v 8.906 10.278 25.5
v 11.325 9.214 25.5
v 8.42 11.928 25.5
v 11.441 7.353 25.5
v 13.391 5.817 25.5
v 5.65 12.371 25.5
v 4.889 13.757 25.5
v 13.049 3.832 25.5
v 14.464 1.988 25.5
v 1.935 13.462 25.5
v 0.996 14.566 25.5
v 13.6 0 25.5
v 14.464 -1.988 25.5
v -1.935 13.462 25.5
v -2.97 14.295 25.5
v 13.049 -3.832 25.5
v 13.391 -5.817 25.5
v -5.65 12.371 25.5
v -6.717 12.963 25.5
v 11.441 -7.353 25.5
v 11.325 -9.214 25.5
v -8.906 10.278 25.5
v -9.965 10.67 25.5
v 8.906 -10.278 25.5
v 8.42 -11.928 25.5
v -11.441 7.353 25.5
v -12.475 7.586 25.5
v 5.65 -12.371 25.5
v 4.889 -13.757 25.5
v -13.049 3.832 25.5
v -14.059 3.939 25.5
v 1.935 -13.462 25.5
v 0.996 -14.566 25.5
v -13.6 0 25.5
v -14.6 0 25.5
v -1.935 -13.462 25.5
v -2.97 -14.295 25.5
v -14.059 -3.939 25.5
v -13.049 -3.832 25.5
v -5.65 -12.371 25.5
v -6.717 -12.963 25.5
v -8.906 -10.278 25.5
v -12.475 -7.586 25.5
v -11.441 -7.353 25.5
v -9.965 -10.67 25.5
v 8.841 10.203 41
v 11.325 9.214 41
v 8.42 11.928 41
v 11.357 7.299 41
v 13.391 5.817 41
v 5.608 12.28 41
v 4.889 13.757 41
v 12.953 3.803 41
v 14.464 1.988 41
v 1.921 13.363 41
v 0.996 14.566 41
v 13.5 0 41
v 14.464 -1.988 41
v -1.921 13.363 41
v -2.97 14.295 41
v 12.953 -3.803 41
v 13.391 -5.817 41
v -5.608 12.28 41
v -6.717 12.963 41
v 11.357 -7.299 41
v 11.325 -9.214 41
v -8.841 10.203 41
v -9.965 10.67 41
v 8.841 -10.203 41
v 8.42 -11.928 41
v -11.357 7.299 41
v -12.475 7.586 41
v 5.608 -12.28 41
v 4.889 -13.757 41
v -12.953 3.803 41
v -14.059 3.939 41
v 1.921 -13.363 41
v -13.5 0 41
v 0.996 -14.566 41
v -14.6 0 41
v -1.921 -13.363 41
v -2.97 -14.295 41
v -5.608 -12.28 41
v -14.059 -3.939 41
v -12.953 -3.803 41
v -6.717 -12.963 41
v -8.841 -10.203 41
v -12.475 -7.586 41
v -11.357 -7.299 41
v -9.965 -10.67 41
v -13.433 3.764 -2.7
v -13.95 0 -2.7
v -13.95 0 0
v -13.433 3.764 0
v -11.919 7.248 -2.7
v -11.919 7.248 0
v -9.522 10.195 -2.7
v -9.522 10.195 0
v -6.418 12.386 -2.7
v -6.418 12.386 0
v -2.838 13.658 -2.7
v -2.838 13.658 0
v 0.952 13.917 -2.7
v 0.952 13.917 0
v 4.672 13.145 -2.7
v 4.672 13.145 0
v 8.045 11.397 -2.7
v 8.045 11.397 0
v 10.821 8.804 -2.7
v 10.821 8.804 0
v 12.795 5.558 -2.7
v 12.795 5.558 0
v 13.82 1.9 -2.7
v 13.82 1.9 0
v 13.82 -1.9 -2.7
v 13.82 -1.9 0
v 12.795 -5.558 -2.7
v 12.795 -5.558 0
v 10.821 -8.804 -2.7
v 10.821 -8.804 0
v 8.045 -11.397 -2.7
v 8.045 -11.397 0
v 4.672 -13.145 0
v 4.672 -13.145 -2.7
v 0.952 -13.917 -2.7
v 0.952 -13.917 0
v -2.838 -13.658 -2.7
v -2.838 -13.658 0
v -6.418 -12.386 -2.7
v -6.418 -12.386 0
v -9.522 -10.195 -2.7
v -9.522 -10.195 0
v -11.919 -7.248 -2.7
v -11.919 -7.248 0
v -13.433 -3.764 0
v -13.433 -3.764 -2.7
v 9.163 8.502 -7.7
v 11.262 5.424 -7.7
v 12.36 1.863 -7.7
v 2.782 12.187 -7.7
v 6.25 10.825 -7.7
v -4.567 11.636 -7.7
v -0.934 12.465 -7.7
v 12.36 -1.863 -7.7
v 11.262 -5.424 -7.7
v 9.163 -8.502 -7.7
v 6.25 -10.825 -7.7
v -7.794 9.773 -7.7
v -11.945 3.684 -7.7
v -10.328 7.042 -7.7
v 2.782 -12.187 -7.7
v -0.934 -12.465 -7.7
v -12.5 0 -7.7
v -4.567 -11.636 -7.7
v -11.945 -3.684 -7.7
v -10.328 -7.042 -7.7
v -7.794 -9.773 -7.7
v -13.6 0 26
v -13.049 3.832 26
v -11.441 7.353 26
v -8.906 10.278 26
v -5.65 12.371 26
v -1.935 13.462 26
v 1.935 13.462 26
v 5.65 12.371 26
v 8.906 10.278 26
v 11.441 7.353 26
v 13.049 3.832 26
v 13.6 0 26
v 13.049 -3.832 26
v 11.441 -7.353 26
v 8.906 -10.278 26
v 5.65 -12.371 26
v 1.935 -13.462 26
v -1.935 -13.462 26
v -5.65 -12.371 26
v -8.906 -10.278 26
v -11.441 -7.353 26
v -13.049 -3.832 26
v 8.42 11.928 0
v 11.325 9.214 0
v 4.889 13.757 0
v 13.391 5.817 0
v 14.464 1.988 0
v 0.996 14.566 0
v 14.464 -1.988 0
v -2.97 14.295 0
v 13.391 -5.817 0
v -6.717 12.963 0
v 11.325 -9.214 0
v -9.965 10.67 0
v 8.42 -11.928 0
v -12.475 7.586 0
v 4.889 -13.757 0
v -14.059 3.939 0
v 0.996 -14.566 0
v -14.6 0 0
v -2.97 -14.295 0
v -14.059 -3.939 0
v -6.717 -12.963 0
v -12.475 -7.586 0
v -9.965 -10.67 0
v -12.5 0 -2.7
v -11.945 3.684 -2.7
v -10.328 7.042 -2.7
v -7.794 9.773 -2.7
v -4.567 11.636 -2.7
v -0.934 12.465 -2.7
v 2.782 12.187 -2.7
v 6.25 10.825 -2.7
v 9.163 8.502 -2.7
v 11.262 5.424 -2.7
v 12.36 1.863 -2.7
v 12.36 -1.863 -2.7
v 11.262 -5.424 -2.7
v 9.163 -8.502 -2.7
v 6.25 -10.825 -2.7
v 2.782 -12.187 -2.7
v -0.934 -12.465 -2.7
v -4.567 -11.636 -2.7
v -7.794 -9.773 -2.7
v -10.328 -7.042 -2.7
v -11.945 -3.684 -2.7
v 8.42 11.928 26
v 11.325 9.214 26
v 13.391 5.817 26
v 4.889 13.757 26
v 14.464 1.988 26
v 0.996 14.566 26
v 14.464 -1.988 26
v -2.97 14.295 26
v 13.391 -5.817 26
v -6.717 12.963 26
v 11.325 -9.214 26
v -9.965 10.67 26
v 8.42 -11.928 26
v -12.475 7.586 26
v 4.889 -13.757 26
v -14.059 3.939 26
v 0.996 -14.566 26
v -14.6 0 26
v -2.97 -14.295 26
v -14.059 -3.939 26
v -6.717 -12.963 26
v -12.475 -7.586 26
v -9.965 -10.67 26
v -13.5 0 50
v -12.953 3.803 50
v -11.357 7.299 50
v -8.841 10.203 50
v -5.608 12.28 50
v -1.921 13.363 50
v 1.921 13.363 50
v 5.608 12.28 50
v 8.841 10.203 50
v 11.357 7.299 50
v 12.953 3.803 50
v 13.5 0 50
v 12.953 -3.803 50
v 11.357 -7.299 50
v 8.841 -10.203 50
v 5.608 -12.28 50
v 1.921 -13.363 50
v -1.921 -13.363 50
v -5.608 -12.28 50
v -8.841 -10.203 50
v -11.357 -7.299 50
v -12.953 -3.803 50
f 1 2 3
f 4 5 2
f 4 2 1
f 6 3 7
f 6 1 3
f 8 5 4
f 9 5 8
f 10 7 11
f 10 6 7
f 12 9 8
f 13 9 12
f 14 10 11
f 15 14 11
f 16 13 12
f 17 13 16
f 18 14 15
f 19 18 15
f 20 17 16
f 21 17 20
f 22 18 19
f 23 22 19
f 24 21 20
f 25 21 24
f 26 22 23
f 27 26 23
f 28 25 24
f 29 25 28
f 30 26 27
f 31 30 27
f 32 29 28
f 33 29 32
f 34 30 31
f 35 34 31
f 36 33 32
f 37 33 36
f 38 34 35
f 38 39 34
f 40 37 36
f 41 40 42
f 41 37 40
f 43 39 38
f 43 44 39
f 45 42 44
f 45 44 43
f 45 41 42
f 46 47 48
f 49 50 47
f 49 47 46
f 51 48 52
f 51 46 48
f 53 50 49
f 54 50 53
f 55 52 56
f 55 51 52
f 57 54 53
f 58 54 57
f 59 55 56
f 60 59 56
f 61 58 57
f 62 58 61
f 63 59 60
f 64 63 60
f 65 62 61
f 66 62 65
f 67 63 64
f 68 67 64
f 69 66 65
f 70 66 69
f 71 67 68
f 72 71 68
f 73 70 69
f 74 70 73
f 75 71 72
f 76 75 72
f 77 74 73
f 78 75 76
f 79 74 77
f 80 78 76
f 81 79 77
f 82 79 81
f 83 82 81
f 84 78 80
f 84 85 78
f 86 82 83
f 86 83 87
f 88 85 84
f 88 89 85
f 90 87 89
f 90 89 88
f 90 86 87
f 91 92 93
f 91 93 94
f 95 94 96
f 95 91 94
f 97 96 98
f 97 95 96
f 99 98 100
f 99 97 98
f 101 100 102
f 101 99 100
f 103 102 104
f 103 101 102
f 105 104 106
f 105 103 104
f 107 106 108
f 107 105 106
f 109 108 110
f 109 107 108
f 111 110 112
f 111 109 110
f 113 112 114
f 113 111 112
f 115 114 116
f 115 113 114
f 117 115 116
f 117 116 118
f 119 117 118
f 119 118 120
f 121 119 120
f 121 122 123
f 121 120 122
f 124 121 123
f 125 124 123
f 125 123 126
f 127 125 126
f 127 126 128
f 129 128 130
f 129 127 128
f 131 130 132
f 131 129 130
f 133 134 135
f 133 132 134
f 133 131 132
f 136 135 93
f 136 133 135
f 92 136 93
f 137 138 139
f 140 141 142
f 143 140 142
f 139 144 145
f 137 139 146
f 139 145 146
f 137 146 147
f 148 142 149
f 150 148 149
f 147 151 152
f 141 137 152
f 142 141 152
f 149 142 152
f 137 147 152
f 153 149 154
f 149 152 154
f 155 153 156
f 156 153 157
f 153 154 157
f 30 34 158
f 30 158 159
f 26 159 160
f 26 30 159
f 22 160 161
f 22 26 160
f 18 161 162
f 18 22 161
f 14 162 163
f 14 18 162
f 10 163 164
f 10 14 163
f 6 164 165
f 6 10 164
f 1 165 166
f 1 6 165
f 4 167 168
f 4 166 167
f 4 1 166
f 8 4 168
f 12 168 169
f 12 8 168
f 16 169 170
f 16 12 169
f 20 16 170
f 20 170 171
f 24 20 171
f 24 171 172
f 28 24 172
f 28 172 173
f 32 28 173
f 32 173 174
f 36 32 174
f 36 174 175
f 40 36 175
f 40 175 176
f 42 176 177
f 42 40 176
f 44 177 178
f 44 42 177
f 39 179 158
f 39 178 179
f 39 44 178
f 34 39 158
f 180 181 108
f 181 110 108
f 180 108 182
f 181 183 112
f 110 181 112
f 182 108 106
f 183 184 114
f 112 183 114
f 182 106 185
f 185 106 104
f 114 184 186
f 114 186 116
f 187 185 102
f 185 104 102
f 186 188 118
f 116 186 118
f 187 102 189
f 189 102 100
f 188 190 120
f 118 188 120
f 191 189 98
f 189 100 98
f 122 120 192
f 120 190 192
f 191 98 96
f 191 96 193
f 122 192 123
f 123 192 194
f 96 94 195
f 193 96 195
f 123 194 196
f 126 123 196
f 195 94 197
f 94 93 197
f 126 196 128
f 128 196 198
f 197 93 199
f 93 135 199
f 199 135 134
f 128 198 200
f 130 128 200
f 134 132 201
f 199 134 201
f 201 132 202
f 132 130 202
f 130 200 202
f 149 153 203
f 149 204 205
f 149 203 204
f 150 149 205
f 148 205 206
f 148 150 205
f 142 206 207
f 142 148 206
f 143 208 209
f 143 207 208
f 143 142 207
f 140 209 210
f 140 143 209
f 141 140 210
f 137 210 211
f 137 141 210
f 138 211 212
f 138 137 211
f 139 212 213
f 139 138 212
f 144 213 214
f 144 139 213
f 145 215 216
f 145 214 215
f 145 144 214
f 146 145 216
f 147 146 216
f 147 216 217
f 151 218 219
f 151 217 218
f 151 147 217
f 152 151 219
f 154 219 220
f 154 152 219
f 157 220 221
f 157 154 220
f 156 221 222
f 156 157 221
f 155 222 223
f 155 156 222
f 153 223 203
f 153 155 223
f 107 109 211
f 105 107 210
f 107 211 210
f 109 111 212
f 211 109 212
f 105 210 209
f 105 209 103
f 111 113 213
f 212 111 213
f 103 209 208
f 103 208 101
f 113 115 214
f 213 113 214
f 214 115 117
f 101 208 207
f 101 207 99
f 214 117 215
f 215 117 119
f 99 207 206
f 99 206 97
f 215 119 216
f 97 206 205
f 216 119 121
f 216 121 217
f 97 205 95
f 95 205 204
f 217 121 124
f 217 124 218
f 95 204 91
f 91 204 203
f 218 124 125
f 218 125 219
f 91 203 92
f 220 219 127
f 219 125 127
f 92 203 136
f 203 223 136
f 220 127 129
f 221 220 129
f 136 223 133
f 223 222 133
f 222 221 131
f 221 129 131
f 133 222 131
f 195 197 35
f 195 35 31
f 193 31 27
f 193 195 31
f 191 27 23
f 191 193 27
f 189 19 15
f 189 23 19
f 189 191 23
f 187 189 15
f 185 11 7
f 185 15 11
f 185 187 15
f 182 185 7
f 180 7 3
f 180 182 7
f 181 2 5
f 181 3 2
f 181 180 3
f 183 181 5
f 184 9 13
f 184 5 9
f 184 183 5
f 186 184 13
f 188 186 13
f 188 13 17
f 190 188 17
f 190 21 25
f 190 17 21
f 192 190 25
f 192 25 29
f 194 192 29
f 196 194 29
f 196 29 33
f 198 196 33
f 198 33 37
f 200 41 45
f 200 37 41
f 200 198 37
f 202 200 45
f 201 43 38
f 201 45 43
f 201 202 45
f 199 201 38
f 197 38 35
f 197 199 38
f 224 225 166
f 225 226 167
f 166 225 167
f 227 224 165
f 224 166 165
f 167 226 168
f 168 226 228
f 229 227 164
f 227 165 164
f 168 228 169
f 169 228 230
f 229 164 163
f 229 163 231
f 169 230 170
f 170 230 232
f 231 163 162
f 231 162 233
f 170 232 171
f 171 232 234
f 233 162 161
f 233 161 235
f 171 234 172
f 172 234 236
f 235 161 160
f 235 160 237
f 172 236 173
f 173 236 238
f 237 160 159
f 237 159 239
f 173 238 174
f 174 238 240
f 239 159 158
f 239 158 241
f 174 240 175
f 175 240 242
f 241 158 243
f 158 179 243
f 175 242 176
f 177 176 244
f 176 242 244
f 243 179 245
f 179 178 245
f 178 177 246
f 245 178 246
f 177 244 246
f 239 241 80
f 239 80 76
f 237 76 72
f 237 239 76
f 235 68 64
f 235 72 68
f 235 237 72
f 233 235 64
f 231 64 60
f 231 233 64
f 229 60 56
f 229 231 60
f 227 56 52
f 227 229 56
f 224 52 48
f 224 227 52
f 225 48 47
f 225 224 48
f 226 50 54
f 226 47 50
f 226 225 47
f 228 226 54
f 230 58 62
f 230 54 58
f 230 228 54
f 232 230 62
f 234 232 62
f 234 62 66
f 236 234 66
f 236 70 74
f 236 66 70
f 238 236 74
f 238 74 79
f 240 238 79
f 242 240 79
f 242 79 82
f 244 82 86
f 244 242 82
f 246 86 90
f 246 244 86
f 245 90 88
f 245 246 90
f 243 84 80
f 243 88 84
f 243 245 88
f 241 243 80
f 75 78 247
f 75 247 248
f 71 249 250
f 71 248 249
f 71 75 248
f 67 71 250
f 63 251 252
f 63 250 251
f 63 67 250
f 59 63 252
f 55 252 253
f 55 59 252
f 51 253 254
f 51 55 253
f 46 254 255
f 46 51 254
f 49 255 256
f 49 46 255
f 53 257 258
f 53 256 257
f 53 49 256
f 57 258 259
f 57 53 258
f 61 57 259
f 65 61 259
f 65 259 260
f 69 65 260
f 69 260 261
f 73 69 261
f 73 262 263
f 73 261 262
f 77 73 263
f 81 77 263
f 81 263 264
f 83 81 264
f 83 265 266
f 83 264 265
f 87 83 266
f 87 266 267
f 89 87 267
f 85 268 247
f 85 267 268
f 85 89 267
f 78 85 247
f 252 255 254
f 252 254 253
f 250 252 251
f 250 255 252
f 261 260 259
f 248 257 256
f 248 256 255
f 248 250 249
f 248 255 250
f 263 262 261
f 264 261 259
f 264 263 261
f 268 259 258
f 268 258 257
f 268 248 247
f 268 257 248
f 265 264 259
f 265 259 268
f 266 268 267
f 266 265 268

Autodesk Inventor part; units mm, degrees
ref_plane "YZ Plane" through (0, 0, 0) normal (1, 0, 0) x (0, 1, 0)
ref_plane "XZ Plane" through (0, 0, 0) normal (0, 1, 0) x (-1, 0, 0)
ref_plane "XY Plane" through (0, 0, 0) normal (0, 0, 1) x (1, 0, 0)
sketch "Skizze1" plane through (0, 0, 0) normal (0, 1, 0) x (-1, 0, 0)
  line L0 (0, 50) -> (13.5, 50)
  line L1 (13.5, 50) -> (13.5, 41)
  line L2 (13.5, 41) -> (14.6, 41)
  line L3 (14.6, 41) -> (14.6, 0)
  line L4 (14.6, 0) -> (0, 0)
  line L5 (0, 0) -> (0, 50)
  line L6 (14.6, 26) -> (13.6, 26)
  line L7 (13.6, 26) -> (13.6, 25.5)
  line L8 (13.6, 25.5) -> (14.6, 25.5)
  line L9 (14.6, 25.5) -> (14.6, 26)
  line L10 (0, 0) -> (13.95, 0)
  line L11 (13.95, 0) -> (13.95, -2.7)
  line L12 (13.95, -2.7) -> (0, -2.7)
  line L13 (0, -2.7) -> (0, 0)
  line L14 (0, -2.7) -> (12.5, -2.7)
  line L15 (12.5, -2.7) -> (12.5, -7.7)
  line L16 (12.5, -7.7) -> (0, -7.7)
  line L17 (0, -7.7) -> (0, -2.7)
  point P0 (14.1, 25.5)
  point P1 (13.6, 25.75)
  point P2 (14.1, 26)
  point P3 (14.05, 41)
  point P4 (13.95, 0)
  dimension "d0" = 13.5
  dimension "d1" = 9
  dimension "d2" = 90
  dimension "d3" = 1.1
  dimension "d4" = 270
  dimension "d5" = 0.5
  dimension "d6" = 1
  dimension "d7" = 15
  dimension "d9" = 13.95
  dimension "d10" = 2.7
  dimension "d13" = 12.5
  dimension "d14" = 5
revolve "Umdrehung1" add sketch "Skizze1" angle 360 about axis through (0, 0, 0) along (0, 0, 1) contours L0 L1 L2 L3 L6 L7 L8 L4 L5 | L4 L11 L12 L13 | L12 L15 L16 L17
thread "Gewinde1" size "M25x2" class "6g" standard "ANSI Metric M Profile" full length
properties part number "00_CCTV_Lens_Hikvision_50mm_2.8"
